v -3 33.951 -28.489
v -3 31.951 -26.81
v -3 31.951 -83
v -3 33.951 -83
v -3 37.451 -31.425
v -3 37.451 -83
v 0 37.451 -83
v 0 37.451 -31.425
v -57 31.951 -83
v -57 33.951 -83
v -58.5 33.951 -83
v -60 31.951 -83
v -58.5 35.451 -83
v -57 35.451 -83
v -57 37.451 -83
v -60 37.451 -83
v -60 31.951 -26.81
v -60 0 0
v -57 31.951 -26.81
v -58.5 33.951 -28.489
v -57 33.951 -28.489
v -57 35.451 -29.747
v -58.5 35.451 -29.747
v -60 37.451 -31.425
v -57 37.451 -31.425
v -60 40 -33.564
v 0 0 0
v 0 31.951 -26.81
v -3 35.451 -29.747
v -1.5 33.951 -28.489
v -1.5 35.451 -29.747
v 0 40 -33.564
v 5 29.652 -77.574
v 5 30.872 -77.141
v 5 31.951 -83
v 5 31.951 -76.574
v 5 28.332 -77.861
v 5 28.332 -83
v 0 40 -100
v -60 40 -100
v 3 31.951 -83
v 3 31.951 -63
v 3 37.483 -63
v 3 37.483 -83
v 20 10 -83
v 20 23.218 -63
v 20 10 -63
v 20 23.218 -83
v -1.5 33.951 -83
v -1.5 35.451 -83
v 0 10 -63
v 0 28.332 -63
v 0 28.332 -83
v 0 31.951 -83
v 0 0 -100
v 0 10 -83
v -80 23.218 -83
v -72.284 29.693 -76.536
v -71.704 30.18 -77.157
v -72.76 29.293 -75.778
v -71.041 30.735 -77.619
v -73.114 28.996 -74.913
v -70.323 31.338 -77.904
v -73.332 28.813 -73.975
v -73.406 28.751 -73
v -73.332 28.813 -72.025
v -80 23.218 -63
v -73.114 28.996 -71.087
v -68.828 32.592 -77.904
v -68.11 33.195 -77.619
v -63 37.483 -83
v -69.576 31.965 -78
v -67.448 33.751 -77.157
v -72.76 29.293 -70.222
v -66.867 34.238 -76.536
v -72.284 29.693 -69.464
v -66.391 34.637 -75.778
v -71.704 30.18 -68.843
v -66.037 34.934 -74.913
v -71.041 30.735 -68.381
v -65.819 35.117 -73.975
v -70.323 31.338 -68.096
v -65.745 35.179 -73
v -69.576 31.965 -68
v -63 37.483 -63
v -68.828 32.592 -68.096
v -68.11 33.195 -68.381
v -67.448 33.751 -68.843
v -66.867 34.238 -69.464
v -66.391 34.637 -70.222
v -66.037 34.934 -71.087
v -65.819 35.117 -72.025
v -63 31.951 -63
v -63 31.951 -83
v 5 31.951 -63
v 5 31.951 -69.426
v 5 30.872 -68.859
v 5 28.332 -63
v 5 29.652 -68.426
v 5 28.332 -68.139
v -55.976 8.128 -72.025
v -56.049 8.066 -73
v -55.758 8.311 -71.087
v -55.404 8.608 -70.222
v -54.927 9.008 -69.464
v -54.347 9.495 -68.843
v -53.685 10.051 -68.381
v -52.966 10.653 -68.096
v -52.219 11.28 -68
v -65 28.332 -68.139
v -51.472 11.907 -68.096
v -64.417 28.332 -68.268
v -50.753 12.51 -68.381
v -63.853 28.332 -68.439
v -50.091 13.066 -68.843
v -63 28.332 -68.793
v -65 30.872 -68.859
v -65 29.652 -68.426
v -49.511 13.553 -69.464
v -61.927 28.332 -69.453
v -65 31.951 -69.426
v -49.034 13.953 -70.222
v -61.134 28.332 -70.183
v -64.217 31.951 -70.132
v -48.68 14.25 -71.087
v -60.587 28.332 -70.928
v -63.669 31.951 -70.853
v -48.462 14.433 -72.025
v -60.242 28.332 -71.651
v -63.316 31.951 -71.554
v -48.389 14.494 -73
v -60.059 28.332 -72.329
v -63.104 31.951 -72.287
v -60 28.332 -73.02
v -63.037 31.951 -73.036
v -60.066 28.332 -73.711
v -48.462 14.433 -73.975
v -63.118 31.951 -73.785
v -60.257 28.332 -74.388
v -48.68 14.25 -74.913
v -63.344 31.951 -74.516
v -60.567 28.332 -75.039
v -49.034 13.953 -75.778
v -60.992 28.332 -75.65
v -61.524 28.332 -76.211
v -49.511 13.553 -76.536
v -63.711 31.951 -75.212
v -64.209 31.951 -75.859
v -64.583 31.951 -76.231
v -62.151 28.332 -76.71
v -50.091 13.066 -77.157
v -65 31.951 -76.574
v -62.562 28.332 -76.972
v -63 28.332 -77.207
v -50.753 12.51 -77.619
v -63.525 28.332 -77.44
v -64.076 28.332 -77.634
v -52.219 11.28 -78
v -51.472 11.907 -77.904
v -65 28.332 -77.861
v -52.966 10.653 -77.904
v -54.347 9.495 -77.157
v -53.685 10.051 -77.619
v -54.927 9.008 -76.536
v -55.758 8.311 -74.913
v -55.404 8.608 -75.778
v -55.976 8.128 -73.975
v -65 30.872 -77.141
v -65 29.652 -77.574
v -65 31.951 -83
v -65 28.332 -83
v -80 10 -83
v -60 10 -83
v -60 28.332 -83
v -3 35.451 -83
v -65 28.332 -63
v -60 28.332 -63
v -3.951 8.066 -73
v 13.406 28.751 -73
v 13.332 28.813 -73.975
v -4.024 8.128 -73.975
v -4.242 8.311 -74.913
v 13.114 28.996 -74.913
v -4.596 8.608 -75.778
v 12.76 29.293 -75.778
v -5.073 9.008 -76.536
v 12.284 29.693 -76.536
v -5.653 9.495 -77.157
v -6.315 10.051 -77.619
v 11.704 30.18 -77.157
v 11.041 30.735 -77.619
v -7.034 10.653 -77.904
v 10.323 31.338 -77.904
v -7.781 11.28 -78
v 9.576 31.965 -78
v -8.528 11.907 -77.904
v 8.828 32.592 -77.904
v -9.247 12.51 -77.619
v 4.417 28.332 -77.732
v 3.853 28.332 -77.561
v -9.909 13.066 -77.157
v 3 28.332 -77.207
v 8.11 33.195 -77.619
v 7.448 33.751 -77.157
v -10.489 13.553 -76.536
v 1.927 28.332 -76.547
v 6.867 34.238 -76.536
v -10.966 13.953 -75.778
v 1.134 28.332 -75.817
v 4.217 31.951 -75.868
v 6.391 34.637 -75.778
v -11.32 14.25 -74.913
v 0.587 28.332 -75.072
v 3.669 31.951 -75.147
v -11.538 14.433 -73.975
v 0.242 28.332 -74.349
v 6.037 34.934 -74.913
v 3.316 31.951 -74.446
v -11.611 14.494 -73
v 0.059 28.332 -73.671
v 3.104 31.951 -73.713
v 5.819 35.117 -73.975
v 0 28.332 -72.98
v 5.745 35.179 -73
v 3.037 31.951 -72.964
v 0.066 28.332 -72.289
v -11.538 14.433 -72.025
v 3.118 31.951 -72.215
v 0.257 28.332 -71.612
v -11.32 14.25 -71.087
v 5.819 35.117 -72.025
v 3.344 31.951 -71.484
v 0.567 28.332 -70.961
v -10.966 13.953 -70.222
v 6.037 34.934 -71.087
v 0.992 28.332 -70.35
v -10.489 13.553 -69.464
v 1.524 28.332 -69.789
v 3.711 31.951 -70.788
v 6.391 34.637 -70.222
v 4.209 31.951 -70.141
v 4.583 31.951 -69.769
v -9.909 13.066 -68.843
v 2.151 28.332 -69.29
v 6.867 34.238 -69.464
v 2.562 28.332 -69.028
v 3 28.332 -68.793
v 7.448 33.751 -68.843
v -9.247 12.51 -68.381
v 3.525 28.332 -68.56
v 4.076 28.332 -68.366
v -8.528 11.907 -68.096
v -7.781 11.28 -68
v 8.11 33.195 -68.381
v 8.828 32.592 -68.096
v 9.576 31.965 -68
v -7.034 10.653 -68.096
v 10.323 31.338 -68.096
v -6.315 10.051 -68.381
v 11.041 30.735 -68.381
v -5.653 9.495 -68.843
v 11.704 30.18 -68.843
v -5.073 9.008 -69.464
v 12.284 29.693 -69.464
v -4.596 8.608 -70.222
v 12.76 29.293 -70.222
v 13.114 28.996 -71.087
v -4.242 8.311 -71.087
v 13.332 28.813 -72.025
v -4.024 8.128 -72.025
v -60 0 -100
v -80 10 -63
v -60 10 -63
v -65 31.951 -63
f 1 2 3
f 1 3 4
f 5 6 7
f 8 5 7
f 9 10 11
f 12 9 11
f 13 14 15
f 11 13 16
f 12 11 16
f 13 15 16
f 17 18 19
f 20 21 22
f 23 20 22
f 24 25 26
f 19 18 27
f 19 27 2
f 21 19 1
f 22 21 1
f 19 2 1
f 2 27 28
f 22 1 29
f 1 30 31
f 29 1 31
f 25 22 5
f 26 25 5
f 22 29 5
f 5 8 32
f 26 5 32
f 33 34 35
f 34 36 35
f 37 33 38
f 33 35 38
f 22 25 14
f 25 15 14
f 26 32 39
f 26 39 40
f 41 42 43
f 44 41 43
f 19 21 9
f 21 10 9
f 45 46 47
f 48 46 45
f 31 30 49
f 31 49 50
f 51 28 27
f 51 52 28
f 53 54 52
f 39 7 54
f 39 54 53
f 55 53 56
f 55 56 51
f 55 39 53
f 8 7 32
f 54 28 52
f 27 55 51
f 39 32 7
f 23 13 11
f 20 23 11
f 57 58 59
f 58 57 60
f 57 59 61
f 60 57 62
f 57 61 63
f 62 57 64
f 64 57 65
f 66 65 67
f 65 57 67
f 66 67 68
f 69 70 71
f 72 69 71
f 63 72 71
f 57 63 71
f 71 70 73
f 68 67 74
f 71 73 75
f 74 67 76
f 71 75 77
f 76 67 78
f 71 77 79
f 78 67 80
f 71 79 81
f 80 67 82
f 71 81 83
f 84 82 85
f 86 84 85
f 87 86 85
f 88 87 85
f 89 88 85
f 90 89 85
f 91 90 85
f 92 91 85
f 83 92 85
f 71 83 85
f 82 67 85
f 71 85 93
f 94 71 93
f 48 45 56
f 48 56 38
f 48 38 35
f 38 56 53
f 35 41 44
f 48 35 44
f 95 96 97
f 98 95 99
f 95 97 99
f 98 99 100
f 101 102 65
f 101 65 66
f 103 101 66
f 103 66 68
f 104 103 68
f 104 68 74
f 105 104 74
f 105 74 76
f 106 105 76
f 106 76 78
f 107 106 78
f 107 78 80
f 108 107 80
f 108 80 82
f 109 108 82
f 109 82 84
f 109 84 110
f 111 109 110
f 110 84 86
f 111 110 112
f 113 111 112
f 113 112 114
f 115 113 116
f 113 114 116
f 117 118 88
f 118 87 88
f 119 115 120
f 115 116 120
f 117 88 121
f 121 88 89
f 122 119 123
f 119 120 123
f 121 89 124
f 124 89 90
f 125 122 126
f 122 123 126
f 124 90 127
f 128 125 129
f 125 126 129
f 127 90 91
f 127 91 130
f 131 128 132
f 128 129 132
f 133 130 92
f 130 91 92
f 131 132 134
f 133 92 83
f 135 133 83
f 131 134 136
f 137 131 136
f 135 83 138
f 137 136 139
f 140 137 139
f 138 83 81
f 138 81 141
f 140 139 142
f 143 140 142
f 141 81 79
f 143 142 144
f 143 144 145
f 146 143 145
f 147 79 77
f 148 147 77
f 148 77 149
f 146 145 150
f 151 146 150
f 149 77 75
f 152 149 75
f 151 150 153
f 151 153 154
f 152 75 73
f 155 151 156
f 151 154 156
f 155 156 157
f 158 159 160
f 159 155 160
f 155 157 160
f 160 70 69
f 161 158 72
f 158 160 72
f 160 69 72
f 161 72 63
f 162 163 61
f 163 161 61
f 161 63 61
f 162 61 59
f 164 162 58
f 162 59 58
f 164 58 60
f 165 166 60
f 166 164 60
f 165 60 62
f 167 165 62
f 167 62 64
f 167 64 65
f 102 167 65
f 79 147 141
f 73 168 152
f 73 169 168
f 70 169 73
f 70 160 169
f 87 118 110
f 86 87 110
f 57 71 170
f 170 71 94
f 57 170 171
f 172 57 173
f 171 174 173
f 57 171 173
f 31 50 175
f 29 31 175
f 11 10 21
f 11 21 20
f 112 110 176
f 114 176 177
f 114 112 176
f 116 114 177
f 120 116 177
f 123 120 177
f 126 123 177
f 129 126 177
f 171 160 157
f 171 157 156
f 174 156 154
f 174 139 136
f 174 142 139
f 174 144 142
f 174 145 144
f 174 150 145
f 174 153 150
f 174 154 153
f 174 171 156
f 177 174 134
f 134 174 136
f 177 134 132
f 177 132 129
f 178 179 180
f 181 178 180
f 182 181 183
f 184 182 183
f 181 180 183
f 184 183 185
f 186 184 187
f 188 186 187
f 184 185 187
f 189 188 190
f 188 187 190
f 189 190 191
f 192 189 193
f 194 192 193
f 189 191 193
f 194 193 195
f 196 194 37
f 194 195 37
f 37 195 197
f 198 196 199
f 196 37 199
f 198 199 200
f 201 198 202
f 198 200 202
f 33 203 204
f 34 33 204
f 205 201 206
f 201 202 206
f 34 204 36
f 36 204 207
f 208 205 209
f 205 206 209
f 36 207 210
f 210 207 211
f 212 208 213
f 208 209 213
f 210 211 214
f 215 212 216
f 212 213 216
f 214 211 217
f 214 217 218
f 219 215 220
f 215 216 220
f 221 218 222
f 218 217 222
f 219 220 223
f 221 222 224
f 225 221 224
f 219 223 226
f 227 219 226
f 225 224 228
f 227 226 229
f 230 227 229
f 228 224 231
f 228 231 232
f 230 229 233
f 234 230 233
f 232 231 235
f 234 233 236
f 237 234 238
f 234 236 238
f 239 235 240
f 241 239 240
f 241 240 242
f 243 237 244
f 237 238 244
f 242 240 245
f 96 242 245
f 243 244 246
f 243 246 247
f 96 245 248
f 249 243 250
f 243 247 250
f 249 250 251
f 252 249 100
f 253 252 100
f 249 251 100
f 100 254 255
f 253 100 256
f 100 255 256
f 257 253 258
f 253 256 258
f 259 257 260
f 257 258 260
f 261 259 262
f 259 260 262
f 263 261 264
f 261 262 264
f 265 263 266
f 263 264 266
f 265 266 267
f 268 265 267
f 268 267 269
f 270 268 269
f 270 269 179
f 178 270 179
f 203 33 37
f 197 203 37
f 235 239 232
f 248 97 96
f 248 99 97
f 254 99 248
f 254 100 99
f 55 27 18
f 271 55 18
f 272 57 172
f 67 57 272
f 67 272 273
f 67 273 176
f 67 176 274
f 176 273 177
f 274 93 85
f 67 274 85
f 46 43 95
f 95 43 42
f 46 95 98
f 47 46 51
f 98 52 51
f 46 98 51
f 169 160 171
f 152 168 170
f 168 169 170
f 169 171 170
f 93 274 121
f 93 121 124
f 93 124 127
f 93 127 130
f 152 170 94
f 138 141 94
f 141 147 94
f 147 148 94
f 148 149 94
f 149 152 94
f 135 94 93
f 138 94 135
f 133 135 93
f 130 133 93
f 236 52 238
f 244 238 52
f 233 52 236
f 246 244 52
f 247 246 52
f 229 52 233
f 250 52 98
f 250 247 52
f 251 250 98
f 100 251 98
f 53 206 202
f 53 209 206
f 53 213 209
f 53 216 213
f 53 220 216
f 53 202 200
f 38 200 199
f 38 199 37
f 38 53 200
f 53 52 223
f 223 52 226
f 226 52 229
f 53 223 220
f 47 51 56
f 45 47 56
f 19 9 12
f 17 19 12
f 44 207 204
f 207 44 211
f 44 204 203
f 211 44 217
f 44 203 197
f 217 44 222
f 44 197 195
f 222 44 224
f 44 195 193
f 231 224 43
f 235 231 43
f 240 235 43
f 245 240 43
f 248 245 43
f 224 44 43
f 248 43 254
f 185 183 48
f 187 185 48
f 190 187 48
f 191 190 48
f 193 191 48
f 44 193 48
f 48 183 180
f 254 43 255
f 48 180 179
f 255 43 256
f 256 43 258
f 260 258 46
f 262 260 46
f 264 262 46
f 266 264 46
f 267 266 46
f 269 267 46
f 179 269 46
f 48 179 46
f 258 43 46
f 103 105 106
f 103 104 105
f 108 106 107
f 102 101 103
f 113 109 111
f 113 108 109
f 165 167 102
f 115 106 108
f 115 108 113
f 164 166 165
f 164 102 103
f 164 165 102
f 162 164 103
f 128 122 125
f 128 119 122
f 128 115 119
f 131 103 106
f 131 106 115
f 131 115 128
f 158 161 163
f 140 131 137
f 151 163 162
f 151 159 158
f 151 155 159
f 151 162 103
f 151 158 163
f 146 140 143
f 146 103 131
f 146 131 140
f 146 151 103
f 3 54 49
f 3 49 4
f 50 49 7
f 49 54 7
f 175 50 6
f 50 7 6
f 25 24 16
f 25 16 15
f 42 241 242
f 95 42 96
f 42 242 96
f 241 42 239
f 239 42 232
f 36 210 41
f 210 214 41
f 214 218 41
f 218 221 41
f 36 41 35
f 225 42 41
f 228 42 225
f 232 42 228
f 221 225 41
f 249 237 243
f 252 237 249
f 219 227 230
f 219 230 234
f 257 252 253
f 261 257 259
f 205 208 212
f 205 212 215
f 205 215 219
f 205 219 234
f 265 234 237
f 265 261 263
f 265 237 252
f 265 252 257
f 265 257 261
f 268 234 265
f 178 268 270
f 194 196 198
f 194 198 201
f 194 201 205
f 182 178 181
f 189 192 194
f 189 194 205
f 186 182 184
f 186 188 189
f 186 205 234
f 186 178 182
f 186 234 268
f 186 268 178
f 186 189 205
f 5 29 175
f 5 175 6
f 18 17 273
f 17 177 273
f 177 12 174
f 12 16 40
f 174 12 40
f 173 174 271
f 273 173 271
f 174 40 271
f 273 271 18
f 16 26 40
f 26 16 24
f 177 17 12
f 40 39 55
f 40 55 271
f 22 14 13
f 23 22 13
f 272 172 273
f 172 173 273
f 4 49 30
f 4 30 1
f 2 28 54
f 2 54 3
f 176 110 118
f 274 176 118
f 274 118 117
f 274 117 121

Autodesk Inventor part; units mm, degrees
ref_plane "YZ Plane" through (0, 0, 0) normal (1, 0, 0) x (0, 1, 0)
ref_plane "XZ Plane" through (0, 0, 0) normal (0, 1, 0) x (-1, 0, 0)
ref_plane "XY Plane" through (0, 0, 0) normal (0, 0, 1) x (1, 0, 0)
sketch "Sketch1" plane through (0, 0, 0) normal (0, 1, 0) x (-1, 0, 0)
  line L0 (0, 0) -> (60, 0)
  line L1 (60, 0) -> (60, -100)
  line L2 (60, -100) -> (0, -100)
  line L3 (0, -100) -> (0, 0)
  dimension "d0" = 100
  dimension "d1" = 60
extrude "Extrusion1" add sketch "Sketch1" along normal blind 40
sketch "Sketch2" plane through (0, 0, 0) normal (1, 0, 0) x (0, 0, -1)
  line L0 (0, 0) -> (37.6485, 44.8677)
  line L1 (0, 0) -> (58.5706, 0) construction
  line L2 (100, 40) -> (0, 40) projected
  line L3 (0, 40) -> (0, 0)
  point P0 (33.564, 40)
  dimension "d4" = 50
extrude "Extrusion2" cut sketch "Sketch2" against normal blind 70
sketch "Sketch3" plane through (0, 0, -100) normal (1, 0, 0) x (0, 0, -1)
  line L0 (0, 0) -> (-17, 0)
  line L1 (-100, 0) -> (0, 0) projected
  line L2 (0, 40) -> (-66.436, 40) projected
  line L3 (-17, 40) -> (-37, 40)
  line L4 (-37, 40) -> (-37, 10)
  line L5 (-37, 10) -> (-17, 10)
  line L6 (-17, 10) -> (-17, 40)
  dimension "d7" = 17
  dimension "d8" = 20
  dimension "d9" = 30
extrude "Extrusion3" add sketch "Sketch3" along normal blind 20
sketch "Sketch4" plane through (0, 10, -63) normal (0, 0, 1) x (1, 0, 0)
  line L0 (0, 30) -> (-60, 30) projected
  line L1 (0, 30) -> (29.4147, 5.3181)
  line L2 (0, 30) -> (38.3982, 30) construction
  line L3 (0, 30) -> (20, 30) projected
  line L4 (0, 30) -> (20, 30)
  line L5 (20, 30) -> (20, 13.218)
  line L6 (20, 0) -> (20, 30) projected
  point P0 (0, -10)
  dimension "d12" = 40
extrude "Extrusion4" cut sketch "Sketch4" against normal blind 61.75
ref_plane "Work Plane1" through (-30, 0, -100) normal (1, 0, 0) x (0, 0, -1)
mirror "Mirror1" about plane through (-30, 0, -100) normal (1, 0, 0) of "Extrusion3", "Extrusion4"
sketch "Sketch5" plane through (0, 40, -63) normal (0.6428, 0.766, 0) x (0.766, -0.6428, 0)
  circle A0 centre (12.5, 10) radius 5
  point P0 (25.7115, -63)
  dimension "d16" = 10
extrude "Extrusion5" cut sketch "Sketch5" against normal blind 27
mirror "Mirror2" about plane through (-30, 0, -100) normal (1, 0, 0) of "Extrusion5"
sketch "Sketch6" plane through (20, 10, -83) normal (0, 0, -1) x (-1, 0, 0)
  line L0 (14.2547, 25.1791) -> (31.6099, 4.4959) projected
  line L1 (6.5942, 18.7512) -> (23.9495, -1.932) projected
  line L2 (20, 30) -> (20, 18.3321)
  line L3 (20, 30) -> (20, 0) projected
  line L4 (20, 18.3321) -> (17, 18.3321)
  line L5 (17, 18.3321) -> (17, 27.4827)
  line L6 (17, 27.4827) -> (20, 30)
  line L7 (20, 23.9074) -> (20, 30)
  line L8 (20, 23.9074) -> (20, 30)
  point P0 (20, -10)
  dimension "d19" = 3
extrude "Extrusion6" cut sketch "Sketch6" against normal blind 81
mirror "Mirror3" about plane through (-30, 0, -100) normal (1, 0, 0) of "Extrusion6"
sketch "Sketch7" plane through (0, 0, -100) normal (0, 0, -1) x (-1, 0, 0)
  line L0 (-3, 28.3321) -> (0, 28.3321) projected
  line L1 (-0.0001, 31.9514) -> (2.9999, 31.9514)
  line L2 (2.9999, 31.9514) -> (2.9999, 33.9514)
  line L3 (1.4999, 33.9514) -> (2.9999, 33.9514)
  line L4 (1.4999, 33.9514) -> (1.4999, 35.4514)
  line L5 (1.4999, 35.4514) -> (2.9999, 35.4514)
  line L6 (2.9999, 35.4514) -> (2.9999, 37.4514)
  line L7 (2.9999, 37.4514) -> (-0.0001, 37.4514)
  line L8 (0, 0) -> (0, 40) projected
  line L9 (0, 37.4515) -> (0, 40)
  line L10 (-0.0001, 37.4514) -> (-0.0001, 31.9514)
  point P0 (0, 37.4514)
  point P1 (0, 31.9514)
  dimension "d23" = 2
  dimension "d24" = 1.5
  dimension "d25" = 2
  dimension "d26" = 1.5
  dimension "d27" = 5.5
  dimension "d28" = 3
extrude "Extrusion7" cut sketch "Sketch7" against normal blind 92.75
sketch "Sketch8" plane through (0, 0, -100) normal (0, 0, -1) x (-1, 0, 0)
  line L0 (2.9999, 37.4514) -> (0, 37.4514) projected
  line L1 (2.9999, 37.4514) -> (0, 37.4514)
  line L2 (0, 31.9514) -> (2.9999, 31.9514) projected
  line L3 (0, 37.4514) -> (0, 31.9514)
  line L4 (0, 31.9514) -> (2.9999, 31.9514)
  line L5 (2.9999, 31.9514) -> (2.9999, 33.9514) projected
  line L6 (2.9999, 31.9514) -> (2.9999, 33.9514)
  line L7 (2.9999, 33.9514) -> (1.4999, 33.9514)
  line L8 (1.4999, 35.4514) -> (1.4999, 33.9514) projected
  line L9 (1.4999, 33.9514) -> (1.4999, 35.4514)
  line L10 (1.4999, 35.4514) -> (2.9999, 35.4514)
  line L11 (2.9999, 35.4514) -> (2.9999, 37.4514)
  point P0 (0, 0)
extrude "Extrusion8" add sketch "Sketch8" against normal blind 17
sketch "Sketch9" plane through (20, 10, -83) normal (0, 0, -1) x (-1, 0, 0)
  line L0 (17, 18.3321) -> (20, 18.3321) projected
  line L1 (17, 18.3321) -> (17, 21.9514)
  line L2 (17, 18.3321) -> (17, 27.4827) projected
  line L3 (17, 21.9514) -> (15, 21.9514)
  line L4 (15, 21.9514) -> (15, 18.3321)
  line L5 (15, 18.3321) -> (17, 18.3321)
  point P0 (20, -10)
  point P1 (20, 21.9514)
  dimension "d33" = 2
  dimension "d34" = 3.6194
extrude "Extrusion9" cut sketch "Sketch9" against normal blind 69.75
mirror "Mirror4" about plane through (-30, 0, -100) normal (1, 0, 0) of "Extrusion7", "Extrusion9"
sketch "Sketch10" plane through (0, 0, -100) normal (0, 0, -1) x (-1, 0, 0)
  line L0 (60, 0) -> (60, 31.9514) projected
  line L1 (57.0001, 31.9514) -> (60, 31.9514) projected
  line L2 (60, 31.9514) -> (57.0001, 31.9514)
  line L3 (57.0001, 33.9514) -> (57.0001, 31.9514) projected
  line L4 (57.0001, 31.9514) -> (57.0001, 33.9514)
  line L5 (57.0001, 33.9514) -> (58.5001, 33.9514)
  line L6 (58.5001, 35.4514) -> (58.5001, 33.9514) projected
  line L7 (58.5001, 33.9514) -> (58.5001, 35.4514)
  line L8 (57.0001, 35.4514) -> (58.5001, 35.4514) projected
  line L9 (58.5001, 35.4514) -> (57.0001, 35.4514)
  line L10 (57.0001, 37.4514) -> (57.0001, 35.4514) projected
  line L11 (57.0001, 35.4514) -> (57.0001, 37.4514)
  line L12 (60, 37.4514) -> (57.0001, 37.4514) projected
  line L13 (57.0001, 37.4514) -> (60, 37.4514)
  line L14 (60, 37.4514) -> (60, 31.9514)
  point P0 (0, 0)
extrude "Extrusion10" add sketch "Sketch10" against normal blind 17
sketch "Sketch11" plane through (0, 0, -100) normal (0, 0, -1) x (-1, 0, 0)
  point P0 (0, 0)
properties part number "taslak2"
